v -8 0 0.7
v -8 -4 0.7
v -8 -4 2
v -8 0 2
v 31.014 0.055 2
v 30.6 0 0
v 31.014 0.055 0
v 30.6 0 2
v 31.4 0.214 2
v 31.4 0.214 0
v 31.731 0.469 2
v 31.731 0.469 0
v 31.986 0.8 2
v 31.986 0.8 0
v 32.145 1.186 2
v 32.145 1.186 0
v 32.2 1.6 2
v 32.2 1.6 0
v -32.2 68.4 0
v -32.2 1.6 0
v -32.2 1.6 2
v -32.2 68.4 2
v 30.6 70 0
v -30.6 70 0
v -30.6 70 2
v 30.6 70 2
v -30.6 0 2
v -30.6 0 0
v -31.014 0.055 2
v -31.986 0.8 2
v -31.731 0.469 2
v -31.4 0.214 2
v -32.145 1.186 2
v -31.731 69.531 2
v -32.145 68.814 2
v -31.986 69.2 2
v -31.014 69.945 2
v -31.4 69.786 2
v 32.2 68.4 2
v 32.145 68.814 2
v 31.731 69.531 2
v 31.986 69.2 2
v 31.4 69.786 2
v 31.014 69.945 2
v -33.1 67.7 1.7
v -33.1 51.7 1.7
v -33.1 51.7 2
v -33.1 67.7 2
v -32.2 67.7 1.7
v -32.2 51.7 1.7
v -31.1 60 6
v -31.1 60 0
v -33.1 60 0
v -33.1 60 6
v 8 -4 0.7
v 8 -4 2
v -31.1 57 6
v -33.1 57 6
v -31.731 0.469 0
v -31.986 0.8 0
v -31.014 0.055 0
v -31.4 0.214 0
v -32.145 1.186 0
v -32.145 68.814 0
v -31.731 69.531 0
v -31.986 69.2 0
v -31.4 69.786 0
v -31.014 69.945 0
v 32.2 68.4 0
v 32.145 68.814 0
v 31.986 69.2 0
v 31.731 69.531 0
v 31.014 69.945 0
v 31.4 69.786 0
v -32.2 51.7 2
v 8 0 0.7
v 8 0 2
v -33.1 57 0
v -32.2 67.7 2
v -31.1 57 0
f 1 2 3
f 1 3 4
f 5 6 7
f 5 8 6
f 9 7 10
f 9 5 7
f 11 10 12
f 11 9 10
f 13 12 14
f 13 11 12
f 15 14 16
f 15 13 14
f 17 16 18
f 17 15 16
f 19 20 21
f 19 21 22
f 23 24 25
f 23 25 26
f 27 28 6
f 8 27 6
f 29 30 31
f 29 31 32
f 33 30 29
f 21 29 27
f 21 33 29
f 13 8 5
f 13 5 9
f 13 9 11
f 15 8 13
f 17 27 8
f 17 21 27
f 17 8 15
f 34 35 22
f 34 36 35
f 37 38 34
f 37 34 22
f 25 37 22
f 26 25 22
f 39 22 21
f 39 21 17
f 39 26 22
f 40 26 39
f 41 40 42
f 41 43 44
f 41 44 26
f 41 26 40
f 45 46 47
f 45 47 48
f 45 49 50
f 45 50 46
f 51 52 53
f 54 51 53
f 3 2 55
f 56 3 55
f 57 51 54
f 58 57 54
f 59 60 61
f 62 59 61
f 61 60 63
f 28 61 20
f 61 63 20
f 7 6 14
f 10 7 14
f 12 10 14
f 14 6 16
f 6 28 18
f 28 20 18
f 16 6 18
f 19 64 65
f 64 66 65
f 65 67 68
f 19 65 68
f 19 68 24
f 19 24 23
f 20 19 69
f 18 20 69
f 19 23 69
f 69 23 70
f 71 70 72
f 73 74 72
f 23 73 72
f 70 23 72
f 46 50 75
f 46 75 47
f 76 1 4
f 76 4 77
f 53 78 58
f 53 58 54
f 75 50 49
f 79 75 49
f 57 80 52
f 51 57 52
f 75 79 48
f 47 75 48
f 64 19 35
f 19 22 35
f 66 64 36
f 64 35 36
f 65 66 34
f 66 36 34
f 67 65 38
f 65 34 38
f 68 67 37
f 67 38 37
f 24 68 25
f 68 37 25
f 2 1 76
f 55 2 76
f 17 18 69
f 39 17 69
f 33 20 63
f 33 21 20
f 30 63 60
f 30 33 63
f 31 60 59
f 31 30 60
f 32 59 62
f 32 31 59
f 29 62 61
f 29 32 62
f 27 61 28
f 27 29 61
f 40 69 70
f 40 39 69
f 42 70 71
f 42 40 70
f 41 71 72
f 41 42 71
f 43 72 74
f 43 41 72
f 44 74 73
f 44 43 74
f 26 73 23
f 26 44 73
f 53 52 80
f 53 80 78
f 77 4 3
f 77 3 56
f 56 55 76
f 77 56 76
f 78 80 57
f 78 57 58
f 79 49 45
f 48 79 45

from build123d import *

# Parameters (mm, degrees)
BOX001_W     = 16
BOX001_H     = 4
BOX001_DEPTH = 1.3
BOX_W        = 64.4
BOX_H        = 70
BOX_DEPTH    = 2
FILLET_R     = 1.6
BOX002_W     = 0.9
BOX002_H     = 16
BOX002_DEPTH = 0.3
BOX003_W     = 2
BOX003_H     = 3
BOX003_DEPTH = 6


with BuildPart() as cube001:
    # Box001 → Box001 (new body)
    with BuildSketch(Plane(origin=(-8, -4, 0.7), x_dir=(1, 0, 0), z_dir=(0, 0, 1))):
        with Locations((8, 2)):
            Rectangle(BOX001_W, BOX001_H)
    extrude(amount=BOX001_DEPTH)


with BuildPart() as fillet_body:
    # Box → Box (new body)
    with BuildSketch(Plane(origin=(-32.2, 0, 0), x_dir=(1, 0, 0), z_dir=(0, 0, 1))):
        with Locations((32.2, 35)):
            Rectangle(BOX_W, BOX_H)
    extrude(amount=BOX_DEPTH)

    # Fillet
    fillet_edges = [fillet_body.edges().sort_by_distance(p)[0] for p in [
        (-32.2, 0, 1),
        (-32.2, 70, 1),
        (32.2, 0, 1),
        (32.2, 70, 1),
    ]]
    fillet(fillet_edges, radius=FILLET_R)


with BuildPart() as cube002:
    # Box002 → Box002 (new body)
    with BuildSketch(Plane(origin=(32.2, 51.7, 1.7), x_dir=(1, 0, 0), z_dir=(0, 0, 1))):
        with Locations((0.45, 8)):
            Rectangle(BOX002_W, BOX002_H)
    extrude(amount=BOX002_DEPTH)


with BuildPart() as part_mirroring:
    # Part__Mirroring: instance of Cube002
    add(cube002.part.mirror(Plane(origin=(0, 0, 0), x_dir=(0, -1, 0), z_dir=(1, 0, 0))))


with BuildPart() as cube003:
    # Box003 → Box003 (new body)
    with BuildSketch(Plane(origin=(31.1, 57, 0), x_dir=(1, 0, 0), z_dir=(0, 0, 1))):
        with Locations((1, 1.5)):
            Rectangle(BOX003_W, BOX003_H)
    extrude(amount=BOX003_DEPTH)


with BuildPart() as part_mirroring001:
    # Part__Mirroring001: instance of Cube003
    add(cube003.part.mirror(Plane(origin=(0, 0, 0), x_dir=(0, -1, 0), z_dir=(1, 0, 0))))


solid = Compound([cube001.part, fillet_body.part, part_mirroring.part, part_mirroring001.part])
